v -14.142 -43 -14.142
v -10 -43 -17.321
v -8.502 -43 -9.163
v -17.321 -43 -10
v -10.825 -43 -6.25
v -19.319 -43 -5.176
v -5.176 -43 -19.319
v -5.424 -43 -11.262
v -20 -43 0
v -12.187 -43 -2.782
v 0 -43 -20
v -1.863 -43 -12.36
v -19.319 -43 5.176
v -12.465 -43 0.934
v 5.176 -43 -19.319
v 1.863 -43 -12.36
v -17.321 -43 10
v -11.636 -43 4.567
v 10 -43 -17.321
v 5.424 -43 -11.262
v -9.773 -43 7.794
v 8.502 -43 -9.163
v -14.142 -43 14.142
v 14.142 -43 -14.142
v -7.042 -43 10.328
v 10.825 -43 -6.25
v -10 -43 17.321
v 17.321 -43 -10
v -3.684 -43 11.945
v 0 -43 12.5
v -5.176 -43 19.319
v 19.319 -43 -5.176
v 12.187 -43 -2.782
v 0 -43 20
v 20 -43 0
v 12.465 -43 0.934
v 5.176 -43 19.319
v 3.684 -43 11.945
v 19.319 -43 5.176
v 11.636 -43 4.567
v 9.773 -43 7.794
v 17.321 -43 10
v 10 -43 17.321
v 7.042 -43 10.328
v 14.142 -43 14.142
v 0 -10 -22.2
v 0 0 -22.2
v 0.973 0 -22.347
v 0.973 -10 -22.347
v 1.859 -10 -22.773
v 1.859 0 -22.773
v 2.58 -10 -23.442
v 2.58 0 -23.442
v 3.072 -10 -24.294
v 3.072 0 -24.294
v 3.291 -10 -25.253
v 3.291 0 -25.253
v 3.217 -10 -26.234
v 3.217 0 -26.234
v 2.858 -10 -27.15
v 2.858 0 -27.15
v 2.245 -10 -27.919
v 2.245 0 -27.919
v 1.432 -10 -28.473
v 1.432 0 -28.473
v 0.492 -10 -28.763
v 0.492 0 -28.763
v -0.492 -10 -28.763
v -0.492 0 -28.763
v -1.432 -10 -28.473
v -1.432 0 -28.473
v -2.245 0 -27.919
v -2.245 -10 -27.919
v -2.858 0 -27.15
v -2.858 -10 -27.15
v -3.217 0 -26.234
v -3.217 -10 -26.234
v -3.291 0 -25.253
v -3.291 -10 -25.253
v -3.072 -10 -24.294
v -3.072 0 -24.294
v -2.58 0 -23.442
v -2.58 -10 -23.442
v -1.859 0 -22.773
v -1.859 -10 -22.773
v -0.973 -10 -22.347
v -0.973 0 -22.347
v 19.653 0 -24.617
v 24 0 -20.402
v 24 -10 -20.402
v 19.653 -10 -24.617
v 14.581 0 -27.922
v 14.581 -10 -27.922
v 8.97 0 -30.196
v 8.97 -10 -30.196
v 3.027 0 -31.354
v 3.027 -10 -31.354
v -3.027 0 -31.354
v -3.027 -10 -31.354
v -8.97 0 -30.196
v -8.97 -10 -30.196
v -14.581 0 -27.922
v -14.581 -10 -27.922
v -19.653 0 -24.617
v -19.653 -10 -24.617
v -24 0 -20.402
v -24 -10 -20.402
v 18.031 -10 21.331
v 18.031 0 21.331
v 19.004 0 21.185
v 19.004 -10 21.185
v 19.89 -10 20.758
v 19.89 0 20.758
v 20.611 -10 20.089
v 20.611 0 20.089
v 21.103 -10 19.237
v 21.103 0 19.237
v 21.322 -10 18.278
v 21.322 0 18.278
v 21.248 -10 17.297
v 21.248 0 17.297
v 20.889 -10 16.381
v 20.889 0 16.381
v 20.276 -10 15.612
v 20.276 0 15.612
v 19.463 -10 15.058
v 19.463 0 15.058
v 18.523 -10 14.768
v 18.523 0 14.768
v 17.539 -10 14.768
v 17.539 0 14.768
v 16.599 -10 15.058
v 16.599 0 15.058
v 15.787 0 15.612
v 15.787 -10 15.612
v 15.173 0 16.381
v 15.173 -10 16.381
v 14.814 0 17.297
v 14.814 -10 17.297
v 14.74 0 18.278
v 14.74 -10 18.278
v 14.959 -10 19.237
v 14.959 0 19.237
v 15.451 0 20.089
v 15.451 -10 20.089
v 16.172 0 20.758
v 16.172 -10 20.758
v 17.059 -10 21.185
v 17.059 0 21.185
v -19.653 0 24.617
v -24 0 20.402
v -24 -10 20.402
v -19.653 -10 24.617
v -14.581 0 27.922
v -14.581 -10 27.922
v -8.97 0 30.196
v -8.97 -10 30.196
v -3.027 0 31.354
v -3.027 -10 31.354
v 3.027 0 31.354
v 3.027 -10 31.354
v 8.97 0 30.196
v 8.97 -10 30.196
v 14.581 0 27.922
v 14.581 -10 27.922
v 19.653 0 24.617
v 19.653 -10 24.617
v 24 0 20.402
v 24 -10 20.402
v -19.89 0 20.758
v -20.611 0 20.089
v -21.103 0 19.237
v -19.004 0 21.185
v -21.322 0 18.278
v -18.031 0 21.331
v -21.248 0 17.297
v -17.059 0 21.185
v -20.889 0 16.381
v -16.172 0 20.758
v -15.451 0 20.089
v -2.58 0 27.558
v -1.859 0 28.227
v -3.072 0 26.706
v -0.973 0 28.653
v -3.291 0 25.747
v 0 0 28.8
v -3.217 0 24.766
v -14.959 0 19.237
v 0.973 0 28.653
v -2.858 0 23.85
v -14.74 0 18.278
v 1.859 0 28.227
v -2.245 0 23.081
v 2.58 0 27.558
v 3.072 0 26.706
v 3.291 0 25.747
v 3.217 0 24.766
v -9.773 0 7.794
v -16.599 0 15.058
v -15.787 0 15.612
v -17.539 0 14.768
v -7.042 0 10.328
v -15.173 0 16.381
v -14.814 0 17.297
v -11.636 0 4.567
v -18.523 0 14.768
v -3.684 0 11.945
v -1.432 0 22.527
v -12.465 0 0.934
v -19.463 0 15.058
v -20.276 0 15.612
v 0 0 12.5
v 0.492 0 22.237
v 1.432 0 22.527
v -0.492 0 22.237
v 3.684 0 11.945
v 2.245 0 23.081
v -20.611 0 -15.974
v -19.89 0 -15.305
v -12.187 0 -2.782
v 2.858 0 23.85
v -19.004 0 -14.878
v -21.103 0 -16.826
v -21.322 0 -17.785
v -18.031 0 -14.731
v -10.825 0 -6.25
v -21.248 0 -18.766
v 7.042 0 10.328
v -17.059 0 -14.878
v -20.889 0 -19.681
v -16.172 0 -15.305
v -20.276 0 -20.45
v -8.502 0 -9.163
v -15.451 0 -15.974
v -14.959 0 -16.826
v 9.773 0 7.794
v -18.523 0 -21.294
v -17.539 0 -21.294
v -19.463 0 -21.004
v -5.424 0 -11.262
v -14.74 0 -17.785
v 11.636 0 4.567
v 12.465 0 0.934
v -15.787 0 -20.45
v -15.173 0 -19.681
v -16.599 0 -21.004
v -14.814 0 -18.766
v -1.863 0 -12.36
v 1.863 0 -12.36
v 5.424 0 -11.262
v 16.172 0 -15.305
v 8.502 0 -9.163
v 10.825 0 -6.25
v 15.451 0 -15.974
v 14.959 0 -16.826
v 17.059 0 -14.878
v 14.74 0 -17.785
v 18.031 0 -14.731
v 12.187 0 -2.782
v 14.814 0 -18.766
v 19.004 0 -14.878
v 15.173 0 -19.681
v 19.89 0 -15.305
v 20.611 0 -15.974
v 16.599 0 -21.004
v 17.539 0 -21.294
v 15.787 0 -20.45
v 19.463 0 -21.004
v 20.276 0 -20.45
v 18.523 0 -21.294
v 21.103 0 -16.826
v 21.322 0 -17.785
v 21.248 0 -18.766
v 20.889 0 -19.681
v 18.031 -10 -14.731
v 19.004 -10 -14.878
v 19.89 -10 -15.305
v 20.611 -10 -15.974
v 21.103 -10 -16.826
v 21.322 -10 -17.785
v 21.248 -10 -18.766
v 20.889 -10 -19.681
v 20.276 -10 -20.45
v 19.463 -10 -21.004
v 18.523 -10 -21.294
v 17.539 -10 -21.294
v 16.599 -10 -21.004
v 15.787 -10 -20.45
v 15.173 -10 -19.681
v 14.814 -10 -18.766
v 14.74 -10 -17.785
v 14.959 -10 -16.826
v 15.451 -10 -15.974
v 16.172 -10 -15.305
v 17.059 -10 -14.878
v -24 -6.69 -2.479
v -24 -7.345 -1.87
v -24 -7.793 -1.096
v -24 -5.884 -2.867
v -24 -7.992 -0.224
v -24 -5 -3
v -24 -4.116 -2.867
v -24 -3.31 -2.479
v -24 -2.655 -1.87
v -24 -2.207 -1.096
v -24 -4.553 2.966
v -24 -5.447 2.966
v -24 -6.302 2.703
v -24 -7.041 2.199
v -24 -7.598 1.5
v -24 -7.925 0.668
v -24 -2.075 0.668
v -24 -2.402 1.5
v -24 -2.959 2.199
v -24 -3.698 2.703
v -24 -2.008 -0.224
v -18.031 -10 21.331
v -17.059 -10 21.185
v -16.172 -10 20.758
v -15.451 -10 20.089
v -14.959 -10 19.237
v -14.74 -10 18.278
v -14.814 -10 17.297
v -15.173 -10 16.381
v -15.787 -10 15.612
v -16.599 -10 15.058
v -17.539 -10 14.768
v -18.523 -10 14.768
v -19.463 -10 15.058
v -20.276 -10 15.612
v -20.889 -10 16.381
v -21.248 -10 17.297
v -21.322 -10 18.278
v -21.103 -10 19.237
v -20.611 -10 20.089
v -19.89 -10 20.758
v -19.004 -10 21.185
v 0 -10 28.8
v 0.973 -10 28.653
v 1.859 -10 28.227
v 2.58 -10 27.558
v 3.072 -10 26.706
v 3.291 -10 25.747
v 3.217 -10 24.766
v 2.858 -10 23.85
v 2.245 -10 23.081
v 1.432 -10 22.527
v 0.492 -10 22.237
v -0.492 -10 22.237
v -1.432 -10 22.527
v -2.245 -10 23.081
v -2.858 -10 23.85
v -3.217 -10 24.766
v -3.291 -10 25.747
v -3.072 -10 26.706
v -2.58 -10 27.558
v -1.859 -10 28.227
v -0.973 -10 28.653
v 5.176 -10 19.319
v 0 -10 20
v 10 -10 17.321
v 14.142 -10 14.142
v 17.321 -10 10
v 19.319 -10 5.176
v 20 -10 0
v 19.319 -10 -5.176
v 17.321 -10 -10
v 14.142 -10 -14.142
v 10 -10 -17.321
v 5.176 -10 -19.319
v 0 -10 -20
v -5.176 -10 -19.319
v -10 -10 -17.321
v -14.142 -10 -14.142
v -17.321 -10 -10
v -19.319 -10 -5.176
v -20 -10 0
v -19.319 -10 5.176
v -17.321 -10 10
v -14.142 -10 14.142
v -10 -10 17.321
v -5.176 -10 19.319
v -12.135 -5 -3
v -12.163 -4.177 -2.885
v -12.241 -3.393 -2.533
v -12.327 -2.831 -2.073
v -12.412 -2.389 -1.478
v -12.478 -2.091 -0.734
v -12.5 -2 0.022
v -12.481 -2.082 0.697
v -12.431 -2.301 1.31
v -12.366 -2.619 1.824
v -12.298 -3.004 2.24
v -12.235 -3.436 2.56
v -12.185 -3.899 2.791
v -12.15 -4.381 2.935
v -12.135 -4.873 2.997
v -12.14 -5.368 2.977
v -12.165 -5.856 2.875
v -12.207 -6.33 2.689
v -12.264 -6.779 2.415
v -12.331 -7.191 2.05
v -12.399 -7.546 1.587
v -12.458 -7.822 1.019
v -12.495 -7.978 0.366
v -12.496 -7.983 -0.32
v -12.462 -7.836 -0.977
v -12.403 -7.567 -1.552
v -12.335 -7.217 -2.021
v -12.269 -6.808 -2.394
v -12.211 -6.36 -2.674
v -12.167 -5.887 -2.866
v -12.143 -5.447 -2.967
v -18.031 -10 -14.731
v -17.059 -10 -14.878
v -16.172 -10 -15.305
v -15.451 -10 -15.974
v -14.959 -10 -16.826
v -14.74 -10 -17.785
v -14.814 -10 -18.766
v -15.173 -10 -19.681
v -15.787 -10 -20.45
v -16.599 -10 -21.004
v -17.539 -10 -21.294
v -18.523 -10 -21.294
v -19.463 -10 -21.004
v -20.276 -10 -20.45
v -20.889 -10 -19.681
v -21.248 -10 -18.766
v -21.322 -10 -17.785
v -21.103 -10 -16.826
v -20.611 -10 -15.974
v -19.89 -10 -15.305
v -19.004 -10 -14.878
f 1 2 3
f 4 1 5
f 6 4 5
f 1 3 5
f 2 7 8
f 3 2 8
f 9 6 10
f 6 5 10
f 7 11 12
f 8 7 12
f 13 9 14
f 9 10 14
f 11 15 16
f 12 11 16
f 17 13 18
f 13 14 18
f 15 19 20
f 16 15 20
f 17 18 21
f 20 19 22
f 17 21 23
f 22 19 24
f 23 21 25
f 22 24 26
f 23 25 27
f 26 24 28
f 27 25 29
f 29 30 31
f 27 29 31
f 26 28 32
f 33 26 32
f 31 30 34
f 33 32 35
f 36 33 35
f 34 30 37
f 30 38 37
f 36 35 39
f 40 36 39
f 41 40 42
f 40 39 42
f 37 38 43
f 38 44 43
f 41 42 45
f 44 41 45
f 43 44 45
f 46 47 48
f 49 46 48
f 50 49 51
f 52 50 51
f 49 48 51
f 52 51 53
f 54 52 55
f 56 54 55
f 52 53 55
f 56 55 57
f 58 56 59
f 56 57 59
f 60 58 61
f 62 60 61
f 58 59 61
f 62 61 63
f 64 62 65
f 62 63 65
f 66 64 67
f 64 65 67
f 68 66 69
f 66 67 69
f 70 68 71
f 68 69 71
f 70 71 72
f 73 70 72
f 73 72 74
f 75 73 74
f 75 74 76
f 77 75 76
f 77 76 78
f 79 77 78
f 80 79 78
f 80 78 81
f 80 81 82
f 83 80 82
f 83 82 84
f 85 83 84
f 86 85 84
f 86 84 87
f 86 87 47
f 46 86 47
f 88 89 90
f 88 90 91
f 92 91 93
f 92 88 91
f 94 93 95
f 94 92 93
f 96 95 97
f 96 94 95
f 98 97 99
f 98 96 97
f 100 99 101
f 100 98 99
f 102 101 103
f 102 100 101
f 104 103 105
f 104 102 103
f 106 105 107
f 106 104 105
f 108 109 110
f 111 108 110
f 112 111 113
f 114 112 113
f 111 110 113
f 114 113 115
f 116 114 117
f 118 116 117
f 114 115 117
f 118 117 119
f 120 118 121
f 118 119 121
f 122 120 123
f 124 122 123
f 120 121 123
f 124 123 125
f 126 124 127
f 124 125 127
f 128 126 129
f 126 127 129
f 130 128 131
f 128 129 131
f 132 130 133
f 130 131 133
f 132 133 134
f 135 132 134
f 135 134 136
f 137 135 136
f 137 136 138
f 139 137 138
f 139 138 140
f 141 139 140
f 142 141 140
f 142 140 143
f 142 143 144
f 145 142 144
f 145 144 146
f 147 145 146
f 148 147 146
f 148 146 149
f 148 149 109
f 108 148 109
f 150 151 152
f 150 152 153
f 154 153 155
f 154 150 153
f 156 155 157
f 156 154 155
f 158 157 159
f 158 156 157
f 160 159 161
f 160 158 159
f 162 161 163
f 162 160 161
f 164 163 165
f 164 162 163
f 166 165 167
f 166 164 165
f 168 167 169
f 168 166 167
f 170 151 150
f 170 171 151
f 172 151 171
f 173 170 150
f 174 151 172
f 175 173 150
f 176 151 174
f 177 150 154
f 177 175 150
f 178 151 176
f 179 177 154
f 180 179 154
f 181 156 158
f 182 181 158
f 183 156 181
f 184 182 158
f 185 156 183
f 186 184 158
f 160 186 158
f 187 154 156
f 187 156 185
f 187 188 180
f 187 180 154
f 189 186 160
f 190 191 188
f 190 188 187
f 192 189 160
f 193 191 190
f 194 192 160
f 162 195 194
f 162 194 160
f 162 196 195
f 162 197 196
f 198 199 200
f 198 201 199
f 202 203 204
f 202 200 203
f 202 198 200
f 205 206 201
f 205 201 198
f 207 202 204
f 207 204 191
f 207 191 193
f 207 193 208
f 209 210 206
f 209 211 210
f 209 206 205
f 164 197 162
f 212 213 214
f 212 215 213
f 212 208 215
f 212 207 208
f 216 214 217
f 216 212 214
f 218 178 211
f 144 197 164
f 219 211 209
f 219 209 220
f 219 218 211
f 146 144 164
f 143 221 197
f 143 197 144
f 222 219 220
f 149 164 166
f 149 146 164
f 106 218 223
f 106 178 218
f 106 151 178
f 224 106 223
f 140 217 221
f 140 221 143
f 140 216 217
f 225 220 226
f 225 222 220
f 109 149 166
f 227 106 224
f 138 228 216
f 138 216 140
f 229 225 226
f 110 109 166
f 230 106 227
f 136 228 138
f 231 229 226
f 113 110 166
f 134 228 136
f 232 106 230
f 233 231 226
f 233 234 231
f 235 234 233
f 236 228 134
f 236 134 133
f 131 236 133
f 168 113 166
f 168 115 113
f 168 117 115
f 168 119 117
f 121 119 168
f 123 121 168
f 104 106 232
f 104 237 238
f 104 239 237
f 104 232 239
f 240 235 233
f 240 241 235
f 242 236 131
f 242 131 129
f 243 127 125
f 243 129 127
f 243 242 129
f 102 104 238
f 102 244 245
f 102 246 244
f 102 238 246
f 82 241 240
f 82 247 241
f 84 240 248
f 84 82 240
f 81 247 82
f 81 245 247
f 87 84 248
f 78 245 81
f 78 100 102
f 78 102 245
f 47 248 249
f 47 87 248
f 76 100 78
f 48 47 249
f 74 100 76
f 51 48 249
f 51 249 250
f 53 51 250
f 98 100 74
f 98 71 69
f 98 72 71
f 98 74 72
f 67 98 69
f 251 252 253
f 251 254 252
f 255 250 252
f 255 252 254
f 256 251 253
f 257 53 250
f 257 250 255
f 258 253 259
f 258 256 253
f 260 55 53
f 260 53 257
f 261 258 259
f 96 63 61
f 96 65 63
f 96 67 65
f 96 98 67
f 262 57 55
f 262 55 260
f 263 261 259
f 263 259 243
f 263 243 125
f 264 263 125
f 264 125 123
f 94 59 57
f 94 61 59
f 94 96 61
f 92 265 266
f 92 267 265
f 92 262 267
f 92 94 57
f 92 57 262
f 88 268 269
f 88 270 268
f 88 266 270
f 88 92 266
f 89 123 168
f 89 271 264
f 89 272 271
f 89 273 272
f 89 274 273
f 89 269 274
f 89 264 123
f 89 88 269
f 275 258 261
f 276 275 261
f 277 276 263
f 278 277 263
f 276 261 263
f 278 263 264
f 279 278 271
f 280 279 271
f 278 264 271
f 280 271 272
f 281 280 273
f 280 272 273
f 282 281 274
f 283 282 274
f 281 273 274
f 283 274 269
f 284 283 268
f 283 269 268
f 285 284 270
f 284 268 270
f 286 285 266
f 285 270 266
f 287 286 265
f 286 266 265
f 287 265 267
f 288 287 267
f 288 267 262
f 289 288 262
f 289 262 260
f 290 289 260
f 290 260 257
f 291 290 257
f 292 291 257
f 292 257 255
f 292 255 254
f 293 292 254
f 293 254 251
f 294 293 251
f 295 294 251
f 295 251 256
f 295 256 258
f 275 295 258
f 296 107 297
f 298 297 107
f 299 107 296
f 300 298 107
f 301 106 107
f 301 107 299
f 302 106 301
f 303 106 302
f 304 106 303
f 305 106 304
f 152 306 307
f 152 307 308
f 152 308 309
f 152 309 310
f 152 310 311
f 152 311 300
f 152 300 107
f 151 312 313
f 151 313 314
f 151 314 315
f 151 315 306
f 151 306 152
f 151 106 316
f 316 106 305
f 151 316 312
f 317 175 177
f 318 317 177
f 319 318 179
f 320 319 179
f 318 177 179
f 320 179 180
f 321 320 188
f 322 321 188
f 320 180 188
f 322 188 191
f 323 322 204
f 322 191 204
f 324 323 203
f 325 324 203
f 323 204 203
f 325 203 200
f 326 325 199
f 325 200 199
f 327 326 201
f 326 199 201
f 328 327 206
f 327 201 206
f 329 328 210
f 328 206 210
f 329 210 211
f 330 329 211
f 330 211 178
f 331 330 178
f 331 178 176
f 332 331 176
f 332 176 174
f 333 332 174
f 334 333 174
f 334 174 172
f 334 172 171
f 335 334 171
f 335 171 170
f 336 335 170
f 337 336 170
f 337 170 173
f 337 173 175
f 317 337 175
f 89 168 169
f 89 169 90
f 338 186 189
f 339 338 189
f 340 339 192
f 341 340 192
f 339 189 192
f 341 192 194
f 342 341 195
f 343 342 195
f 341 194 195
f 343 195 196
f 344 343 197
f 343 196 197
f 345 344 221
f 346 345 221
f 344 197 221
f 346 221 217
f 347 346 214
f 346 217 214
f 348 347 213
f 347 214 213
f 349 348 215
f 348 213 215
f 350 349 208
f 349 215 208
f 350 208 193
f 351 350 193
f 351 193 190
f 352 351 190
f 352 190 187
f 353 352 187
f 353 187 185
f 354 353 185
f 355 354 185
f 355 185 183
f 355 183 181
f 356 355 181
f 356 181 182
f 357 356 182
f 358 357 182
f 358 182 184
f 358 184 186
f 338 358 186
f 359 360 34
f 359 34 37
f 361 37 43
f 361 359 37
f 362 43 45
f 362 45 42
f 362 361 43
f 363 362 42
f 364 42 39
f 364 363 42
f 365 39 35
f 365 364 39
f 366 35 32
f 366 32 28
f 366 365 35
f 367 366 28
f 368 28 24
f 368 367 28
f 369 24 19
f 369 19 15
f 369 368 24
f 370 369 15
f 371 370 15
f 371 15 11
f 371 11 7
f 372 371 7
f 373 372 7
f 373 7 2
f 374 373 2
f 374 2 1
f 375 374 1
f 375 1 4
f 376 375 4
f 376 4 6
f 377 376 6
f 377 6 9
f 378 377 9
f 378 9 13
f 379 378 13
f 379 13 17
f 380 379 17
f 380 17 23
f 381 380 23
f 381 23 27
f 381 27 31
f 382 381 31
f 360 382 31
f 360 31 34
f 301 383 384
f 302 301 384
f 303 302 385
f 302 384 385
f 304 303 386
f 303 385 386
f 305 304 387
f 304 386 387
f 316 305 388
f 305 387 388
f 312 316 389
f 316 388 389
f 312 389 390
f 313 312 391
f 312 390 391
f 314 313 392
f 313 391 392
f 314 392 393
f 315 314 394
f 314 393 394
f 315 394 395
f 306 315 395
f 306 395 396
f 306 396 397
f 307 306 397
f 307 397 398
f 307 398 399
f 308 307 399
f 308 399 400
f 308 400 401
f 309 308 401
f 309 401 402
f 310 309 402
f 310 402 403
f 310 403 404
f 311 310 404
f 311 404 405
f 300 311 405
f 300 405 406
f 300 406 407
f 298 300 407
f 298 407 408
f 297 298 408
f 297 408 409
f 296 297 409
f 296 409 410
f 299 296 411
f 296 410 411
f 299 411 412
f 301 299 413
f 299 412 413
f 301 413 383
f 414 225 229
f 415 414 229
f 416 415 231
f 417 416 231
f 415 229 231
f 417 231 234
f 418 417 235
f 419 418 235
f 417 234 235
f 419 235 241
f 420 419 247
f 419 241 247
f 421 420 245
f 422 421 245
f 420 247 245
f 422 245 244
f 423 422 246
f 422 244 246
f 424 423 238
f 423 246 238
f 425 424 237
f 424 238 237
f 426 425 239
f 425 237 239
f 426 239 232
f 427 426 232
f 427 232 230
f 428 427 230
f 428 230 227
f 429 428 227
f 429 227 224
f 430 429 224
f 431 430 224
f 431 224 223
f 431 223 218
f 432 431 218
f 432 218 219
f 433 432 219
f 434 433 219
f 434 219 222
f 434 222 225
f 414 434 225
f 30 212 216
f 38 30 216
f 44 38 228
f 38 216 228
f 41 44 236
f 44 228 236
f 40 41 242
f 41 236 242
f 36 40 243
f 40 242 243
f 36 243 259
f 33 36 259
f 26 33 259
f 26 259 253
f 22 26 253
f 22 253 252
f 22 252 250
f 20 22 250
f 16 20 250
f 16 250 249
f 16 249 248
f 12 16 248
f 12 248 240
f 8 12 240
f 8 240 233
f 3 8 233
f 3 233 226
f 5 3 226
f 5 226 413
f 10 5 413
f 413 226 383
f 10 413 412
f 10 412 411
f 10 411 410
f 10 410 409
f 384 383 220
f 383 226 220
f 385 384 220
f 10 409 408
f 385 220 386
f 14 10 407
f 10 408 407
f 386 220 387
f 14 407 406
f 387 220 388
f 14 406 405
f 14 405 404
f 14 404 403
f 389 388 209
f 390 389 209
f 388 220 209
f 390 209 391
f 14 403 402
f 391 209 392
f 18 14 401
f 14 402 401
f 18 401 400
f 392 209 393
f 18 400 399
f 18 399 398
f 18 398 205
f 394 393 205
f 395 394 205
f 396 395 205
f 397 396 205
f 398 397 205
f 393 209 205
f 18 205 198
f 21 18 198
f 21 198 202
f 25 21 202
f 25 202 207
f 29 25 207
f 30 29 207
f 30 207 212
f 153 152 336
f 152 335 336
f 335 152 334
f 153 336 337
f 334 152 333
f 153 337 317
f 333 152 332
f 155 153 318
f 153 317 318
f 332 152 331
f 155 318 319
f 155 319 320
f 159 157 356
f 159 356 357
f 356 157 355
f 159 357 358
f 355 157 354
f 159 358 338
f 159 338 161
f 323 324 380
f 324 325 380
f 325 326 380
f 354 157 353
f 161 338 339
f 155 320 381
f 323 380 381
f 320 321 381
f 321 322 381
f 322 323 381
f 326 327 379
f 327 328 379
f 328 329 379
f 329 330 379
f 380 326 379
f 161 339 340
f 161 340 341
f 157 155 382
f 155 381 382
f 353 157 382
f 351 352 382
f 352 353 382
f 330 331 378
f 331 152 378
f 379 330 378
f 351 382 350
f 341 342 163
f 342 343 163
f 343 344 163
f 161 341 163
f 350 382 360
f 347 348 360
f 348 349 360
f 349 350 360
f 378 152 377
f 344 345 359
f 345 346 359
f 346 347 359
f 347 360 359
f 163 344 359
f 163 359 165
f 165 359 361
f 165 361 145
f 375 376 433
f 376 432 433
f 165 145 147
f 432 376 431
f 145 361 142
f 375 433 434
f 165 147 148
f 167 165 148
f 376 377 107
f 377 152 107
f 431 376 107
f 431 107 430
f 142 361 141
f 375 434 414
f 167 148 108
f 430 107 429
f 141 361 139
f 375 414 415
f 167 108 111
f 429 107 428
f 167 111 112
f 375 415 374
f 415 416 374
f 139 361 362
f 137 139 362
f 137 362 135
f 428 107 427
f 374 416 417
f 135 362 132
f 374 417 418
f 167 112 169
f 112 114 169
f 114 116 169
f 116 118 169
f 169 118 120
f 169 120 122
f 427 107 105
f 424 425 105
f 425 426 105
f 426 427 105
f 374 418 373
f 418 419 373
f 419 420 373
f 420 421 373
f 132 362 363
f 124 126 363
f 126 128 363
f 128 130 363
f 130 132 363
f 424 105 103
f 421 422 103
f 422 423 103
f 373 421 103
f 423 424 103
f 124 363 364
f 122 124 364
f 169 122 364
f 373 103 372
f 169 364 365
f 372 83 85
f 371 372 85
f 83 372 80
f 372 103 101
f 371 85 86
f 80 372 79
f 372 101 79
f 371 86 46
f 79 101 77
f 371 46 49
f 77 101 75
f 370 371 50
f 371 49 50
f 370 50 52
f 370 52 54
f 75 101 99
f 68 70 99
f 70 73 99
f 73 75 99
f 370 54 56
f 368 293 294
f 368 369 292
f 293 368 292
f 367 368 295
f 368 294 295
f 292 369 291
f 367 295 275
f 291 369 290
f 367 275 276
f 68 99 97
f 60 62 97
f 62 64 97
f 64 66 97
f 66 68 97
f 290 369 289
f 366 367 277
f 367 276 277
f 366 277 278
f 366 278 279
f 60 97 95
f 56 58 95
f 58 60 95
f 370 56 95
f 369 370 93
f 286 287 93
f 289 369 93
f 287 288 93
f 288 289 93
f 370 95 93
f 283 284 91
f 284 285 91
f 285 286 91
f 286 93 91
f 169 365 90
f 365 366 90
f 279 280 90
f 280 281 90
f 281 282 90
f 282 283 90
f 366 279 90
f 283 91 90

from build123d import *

# Parameters (mm, degrees)
SKETCH_1_R          = 12.5
EXTRUDE_1_DEPTH     = 10
SKETCH_2_R          = 20
SKETCH_2_R_2        = 12.5
EXTRUDE_2_DEPTH     = 43
SKETCH_3_R          = 3.3
CUT_EXTRUDE_1_DEPTH = 59.457249337
SKETCH_4_R          = 3
CUT_EXTRUDE_2_DEPTH = 59.457249337


with BuildPart() as part:
    # 草图1 → 凸台-拉伸1 (new body)
    with BuildSketch(Plane(origin=(0, 0, 0), x_dir=(1, 0, 0), z_dir=(0, 1, 0))):
        with BuildLine():
            Line((-24, 20.402205763), (-24, -20.402205763))
            ThreePointArc((-24, -20.402205763), (0, -31.5), (24, -20.402205763))
            Line((24, -20.402205763), (24, 20.402205763))
            ThreePointArc((24, 20.402205763), (0, 31.5), (-24, 20.402205763))
        make_face()
        with Locations(Location((0, 0, 0), (0, 0, 270))):
            Circle(SKETCH_1_R, mode=Mode.SUBTRACT)
    extrude(amount=-EXTRUDE_1_DEPTH)

    # 草图2 → 凸台-拉伸2 (add)
    with BuildSketch(Plane(origin=(0, 0, 0), x_dir=(1, 0, 0), z_dir=(0, 1, 0))):
        with Locations(Location((0, 0, 0), (0, 0, 270))):
            Circle(SKETCH_2_R)
        with Locations(Location((0, 0, 0), (0, 0, 270))):
            Circle(SKETCH_2_R_2, mode=Mode.SUBTRACT)
    extrude(amount=-EXTRUDE_2_DEPTH)

    # 草图3 → 切除-拉伸1 (cut, through all)
    with BuildSketch(Plane(origin=(0, 0, 0), x_dir=(1, 0, 0), z_dir=(0, 1, 0))):
        with Locations(Location((0, 25.5, 0), (0, 0, 270))):
            Circle(SKETCH_3_R)
        with Locations(Location((-18.03122292, 18.03122292, 0), (0, 0, 270))):
            Circle(SKETCH_3_R)
        with Locations(Location((18.03122292, 18.03122292, 0), (0, 0, 270))):
            Circle(SKETCH_3_R)
        with Locations(Location((18.03122292, -18.03122292, 0), (0, 0, 270))):
            Circle(SKETCH_3_R)
        with Locations(Location((-18.03122292, -18.03122292, 0), (0, 0, 270))):
            Circle(SKETCH_3_R)
        with Locations(Location((0, -25.5, 0), (0, 0, 270))):
            Circle(SKETCH_3_R)
    extrude(amount=-CUT_EXTRUDE_1_DEPTH, mode=Mode.SUBTRACT)

    # 草图4 → 切除-拉伸2 (cut, through all)
    with BuildSketch(Plane(origin=(0, 0, 0), x_dir=(0, 0, -1), z_dir=(1, 0, 0))):
        with Locations((0, -5)):
            Circle(SKETCH_4_R)
    extrude(amount=-CUT_EXTRUDE_2_DEPTH, mode=Mode.SUBTRACT)


solid = part.part
